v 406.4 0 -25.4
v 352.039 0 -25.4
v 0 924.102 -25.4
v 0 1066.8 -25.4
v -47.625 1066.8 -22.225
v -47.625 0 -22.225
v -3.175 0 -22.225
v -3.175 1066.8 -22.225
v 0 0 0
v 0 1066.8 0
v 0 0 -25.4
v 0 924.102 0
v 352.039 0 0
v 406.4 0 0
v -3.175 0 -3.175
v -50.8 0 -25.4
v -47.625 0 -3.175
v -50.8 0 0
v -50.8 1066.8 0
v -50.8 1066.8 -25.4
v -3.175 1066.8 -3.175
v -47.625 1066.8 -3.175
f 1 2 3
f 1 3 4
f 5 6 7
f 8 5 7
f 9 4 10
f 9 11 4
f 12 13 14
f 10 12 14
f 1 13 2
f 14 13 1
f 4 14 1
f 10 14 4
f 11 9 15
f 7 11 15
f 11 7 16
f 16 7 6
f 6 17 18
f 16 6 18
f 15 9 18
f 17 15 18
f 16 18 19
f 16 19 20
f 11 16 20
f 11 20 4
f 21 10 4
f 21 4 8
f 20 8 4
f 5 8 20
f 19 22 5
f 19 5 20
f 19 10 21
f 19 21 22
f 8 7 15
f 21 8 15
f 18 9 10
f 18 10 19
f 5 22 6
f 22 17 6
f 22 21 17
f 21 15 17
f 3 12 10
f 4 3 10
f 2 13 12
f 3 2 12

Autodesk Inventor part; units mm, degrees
ref_plane "YZ Plane" through (0, 0, 0) normal (1, 0, 0) x (0, 1, 0)
ref_plane "XZ Plane" through (0, 0, 0) normal (0, 1, 0) x (-1, 0, 0)
ref_plane "XY Plane" through (0, 0, 0) normal (0, 0, 1) x (1, 0, 0)
sketch "Sketch1" plane through (0, 0, 0) normal (0, 1, 0) x (-1, 0, 0)
  line L0 (0, 0) -> (50.8, 0)
  line L1 (50.8, 0) -> (50.8, -25.4)
  line L2 (50.8, -25.4) -> (0, -25.4)
  line L3 (0, -25.4) -> (0, 0)
  dimension "d0" = 50.8
  dimension "d1" = 25.4
extrude "Extrusion1" add sketch "Sketch1" along normal blind 1066.8
shell "Shell1" thickness 3.175 removed faces 2 at (-16.9333, 0, -16.9333) at (-16.9333, 1066.8, -16.9333)
sketch "Sketch2" plane through (-50.8, 0, 0) normal (0, 0, 1) x (1, 0, 0)
  line L0 (457.2, 0) -> (50.8, 1066.8)
  line L1 (402.8387, 0) -> (50.8, 924.1015)
  line L2 (50.8, 0) -> (50.8, 1066.8) projected
  line L3 (50.8, 0) -> (457.2, 0)
  point P0 (50.8, 1058.5302)
  dimension "d6" = 50.8
  dimension "d7" = 406.4
extrude "Extrusion2" add sketch "Sketch2" against normal up to surface (25.4 mm away) separate body contours L3 L1 L2 L0
